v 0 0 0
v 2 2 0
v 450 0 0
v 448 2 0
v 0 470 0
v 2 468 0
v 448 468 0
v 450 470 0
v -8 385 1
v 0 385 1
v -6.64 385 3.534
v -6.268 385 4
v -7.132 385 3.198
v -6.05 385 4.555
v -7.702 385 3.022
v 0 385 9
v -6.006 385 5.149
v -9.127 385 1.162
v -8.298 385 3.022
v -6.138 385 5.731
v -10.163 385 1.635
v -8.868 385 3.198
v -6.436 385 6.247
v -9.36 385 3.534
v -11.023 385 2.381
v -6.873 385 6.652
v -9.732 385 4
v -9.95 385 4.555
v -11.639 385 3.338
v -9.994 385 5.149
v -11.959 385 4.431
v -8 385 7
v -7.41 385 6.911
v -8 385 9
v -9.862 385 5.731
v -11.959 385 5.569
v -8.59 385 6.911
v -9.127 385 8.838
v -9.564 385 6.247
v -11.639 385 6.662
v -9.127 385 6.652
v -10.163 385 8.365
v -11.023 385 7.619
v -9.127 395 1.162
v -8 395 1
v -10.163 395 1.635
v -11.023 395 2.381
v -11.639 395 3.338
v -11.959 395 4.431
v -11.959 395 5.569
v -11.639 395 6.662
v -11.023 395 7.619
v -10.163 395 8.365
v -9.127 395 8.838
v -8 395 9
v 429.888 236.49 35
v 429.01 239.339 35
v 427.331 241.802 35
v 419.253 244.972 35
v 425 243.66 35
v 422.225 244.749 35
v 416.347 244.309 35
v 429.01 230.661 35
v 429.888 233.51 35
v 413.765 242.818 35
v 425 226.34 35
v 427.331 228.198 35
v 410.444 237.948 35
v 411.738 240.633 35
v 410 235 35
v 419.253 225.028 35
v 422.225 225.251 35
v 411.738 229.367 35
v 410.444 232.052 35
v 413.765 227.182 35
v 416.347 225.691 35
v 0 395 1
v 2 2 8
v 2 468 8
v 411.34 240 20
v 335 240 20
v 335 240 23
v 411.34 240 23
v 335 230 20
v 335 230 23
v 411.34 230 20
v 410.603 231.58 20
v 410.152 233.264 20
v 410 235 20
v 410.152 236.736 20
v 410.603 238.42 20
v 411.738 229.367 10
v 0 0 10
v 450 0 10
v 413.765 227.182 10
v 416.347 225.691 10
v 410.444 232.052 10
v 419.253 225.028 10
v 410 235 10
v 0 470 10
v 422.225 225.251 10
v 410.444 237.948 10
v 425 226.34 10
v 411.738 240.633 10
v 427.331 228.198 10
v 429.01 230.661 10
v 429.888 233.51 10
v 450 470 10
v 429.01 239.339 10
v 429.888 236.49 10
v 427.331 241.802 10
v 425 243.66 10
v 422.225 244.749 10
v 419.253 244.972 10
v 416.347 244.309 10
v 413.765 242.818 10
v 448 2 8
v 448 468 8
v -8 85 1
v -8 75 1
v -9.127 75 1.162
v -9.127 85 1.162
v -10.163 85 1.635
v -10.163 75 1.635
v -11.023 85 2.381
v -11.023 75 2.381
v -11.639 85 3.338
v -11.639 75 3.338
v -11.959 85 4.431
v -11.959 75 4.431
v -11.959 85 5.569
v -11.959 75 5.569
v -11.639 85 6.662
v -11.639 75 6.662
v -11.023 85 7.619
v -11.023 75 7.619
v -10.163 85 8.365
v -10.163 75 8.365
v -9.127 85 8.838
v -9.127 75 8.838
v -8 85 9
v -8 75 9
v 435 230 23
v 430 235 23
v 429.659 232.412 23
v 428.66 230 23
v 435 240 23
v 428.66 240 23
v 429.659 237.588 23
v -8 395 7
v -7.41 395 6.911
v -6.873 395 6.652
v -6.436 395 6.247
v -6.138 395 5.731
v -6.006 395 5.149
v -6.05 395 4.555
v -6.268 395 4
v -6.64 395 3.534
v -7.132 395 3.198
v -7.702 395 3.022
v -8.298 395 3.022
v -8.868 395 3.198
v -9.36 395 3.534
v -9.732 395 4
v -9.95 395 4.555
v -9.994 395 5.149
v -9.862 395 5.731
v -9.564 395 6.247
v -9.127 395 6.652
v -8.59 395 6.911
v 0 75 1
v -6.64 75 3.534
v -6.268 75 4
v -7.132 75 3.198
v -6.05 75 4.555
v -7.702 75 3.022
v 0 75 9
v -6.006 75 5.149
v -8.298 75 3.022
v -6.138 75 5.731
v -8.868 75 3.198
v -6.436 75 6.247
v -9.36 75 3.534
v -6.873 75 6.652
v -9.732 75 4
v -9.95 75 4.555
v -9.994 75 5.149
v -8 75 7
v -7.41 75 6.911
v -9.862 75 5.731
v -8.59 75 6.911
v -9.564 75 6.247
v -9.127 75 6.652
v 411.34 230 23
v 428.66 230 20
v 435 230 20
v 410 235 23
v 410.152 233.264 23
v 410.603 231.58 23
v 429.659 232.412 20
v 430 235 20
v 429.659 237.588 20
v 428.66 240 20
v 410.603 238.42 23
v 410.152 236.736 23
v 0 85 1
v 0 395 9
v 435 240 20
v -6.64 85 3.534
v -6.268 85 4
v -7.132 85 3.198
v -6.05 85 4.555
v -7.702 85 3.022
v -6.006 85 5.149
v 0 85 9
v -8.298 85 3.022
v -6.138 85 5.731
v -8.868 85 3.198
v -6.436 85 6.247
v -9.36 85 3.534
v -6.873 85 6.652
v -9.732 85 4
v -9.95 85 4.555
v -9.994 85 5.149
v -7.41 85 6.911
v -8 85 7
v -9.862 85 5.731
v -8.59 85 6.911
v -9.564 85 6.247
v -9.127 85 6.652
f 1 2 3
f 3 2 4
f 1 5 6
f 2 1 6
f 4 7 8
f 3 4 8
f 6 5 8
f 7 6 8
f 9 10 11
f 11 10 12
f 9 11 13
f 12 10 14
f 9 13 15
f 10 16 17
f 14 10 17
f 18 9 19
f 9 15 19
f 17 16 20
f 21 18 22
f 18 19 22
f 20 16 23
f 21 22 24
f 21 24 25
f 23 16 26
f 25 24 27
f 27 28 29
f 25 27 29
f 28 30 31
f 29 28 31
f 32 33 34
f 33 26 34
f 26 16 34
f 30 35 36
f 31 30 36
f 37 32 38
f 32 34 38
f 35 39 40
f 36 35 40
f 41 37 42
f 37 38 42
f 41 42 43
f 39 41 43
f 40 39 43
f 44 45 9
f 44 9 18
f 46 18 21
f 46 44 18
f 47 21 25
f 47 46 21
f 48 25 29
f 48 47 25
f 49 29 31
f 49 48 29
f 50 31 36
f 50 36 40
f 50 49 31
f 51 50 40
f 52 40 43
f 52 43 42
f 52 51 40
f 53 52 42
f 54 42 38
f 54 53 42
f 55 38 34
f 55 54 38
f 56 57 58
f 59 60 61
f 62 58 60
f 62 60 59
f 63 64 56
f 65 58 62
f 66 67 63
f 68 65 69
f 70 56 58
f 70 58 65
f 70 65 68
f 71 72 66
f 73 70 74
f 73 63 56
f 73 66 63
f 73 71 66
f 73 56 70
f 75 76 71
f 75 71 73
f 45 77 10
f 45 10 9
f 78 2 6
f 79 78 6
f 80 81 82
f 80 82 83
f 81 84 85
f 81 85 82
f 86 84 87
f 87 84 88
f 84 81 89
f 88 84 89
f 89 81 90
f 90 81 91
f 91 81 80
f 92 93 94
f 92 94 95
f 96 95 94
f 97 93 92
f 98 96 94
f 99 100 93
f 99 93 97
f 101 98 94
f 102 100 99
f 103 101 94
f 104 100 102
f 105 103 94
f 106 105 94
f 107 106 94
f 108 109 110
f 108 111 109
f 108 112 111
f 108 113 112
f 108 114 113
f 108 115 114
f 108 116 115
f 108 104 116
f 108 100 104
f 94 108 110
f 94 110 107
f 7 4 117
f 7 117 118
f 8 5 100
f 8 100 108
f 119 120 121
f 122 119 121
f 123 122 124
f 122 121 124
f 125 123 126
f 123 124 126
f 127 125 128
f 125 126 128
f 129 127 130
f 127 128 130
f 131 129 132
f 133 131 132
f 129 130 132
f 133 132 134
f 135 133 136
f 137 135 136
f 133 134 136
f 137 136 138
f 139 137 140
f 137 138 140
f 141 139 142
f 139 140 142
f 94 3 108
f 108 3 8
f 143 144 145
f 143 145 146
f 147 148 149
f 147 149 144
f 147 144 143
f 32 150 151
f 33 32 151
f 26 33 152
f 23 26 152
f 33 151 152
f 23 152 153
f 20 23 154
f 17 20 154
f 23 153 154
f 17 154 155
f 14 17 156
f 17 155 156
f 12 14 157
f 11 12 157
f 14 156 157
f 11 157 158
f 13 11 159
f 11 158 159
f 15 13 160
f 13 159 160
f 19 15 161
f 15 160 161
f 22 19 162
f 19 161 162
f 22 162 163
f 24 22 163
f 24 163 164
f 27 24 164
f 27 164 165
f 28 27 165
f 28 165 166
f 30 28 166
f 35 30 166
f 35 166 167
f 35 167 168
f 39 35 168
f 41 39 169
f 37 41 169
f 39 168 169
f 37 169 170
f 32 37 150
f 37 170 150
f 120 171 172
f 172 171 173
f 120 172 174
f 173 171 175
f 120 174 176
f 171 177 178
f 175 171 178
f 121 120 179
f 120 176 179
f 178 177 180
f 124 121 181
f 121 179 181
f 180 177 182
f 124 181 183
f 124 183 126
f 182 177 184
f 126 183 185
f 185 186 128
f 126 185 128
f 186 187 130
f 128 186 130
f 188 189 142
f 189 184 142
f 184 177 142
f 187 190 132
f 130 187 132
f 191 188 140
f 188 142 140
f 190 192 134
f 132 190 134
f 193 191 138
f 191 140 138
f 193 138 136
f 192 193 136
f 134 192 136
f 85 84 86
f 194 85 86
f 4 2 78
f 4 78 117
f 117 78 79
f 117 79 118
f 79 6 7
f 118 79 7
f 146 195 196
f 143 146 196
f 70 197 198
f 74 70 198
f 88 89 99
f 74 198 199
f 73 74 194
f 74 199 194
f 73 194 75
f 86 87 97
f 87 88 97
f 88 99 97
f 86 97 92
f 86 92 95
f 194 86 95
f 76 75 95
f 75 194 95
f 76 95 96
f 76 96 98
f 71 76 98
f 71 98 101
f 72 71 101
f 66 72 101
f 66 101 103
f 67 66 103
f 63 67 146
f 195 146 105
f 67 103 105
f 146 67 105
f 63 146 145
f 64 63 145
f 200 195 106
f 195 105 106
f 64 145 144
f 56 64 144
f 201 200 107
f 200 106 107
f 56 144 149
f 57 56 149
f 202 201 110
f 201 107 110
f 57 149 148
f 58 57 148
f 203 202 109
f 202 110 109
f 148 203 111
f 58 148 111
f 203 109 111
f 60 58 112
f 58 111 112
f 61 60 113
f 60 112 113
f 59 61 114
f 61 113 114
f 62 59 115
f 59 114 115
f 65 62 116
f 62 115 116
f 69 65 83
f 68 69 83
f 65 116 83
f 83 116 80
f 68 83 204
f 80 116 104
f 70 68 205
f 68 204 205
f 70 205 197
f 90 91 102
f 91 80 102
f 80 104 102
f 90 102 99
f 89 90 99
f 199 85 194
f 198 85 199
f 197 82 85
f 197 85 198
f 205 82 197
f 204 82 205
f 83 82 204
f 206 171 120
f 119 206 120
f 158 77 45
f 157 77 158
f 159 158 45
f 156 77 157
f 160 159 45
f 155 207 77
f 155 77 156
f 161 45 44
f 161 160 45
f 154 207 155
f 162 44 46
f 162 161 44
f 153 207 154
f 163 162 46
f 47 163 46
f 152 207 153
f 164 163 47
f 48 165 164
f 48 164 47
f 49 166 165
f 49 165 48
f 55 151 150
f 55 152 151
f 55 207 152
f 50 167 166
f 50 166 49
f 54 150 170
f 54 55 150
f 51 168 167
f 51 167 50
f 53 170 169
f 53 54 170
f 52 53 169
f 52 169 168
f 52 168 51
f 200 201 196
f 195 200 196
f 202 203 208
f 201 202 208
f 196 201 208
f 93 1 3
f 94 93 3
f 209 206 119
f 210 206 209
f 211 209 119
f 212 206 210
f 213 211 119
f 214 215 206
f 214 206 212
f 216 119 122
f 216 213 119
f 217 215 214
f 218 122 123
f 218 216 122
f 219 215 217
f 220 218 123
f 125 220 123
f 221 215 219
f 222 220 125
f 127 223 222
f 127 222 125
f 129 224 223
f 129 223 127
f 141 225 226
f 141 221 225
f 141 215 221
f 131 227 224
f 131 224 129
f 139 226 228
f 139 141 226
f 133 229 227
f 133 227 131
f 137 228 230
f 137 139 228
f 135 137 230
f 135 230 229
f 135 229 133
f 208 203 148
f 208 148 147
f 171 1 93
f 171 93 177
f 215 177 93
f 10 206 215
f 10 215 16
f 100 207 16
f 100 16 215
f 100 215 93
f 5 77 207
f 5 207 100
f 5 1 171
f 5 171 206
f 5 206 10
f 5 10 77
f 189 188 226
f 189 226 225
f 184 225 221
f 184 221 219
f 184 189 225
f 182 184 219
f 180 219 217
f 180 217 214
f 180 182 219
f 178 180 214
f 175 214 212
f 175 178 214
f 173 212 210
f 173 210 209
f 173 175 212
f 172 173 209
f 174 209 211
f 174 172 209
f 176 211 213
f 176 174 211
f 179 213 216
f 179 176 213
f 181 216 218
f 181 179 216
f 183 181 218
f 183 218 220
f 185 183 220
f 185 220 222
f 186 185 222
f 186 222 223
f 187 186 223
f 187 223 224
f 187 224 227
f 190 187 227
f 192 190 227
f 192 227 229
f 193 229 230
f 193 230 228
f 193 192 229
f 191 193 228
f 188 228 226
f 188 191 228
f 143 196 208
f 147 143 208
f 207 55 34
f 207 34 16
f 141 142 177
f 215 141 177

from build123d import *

# Parameters (mm, degrees)
SKETCH1_W           = 450
SKETCH1_H           = 470
BASE_EXTRUDE_DEPTH  = 10
SHELL1_T            = -2
SKETCH2_R           = 2
BOSS_EXTRUDE1_DEPTH = 10
SKETCH3_R           = 10
BOSS_EXTRUDE2_DEPTH = 25
SKETCH4_W           = 100
SKETCH4_H           = 10
BOSS_EXTRUDE3_DEPTH = 3


with BuildPart() as part:
    # Sketch1 → Base-Extrude (new body)
    with BuildSketch(Plane.XY):
        with Locations((225, 235)):
            Rectangle(SKETCH1_W, SKETCH1_H)
    extrude(amount=BASE_EXTRUDE_DEPTH)

    # Shell1
    shell1_openings = [part.faces().sort_by_distance(p)[0] for p in [
        (225, 235, 0),
    ]]
    offset(amount=SHELL1_T, openings=shell1_openings, kind=Kind.INTERSECTION)

    # Sketch2 → Boss-Extrude1 (add)
    with BuildSketch(Plane(origin=(0, 395, 0), x_dir=(-1, 0, 0), z_dir=(0, 1, 0))):
        with BuildLine():
            Line((8, 9), (0, 9))
            Line((0, 9), (0, 1))
            Line((0, 1), (8, 1))
            ThreePointArc((8, 1), (12, 5), (8, 9))
        make_face()
        with Locations(Location((8, 5, 0), (0, 0, 90))):
            Circle(SKETCH2_R, mode=Mode.SUBTRACT)
    boss_extrude1 = extrude(amount=-BOSS_EXTRUDE1_DEPTH)

    # Mirror1: Boss-Extrude1 across plane
    add(boss_extrude1.mirror(Plane.ZX.offset(235)))

    # Sketch3 → Boss-Extrude2 (add)
    with BuildSketch(Plane.XY.offset(10)):
        with Locations(Location((420, 235, 0), (0, 0, 180))):
            Circle(SKETCH3_R)
    extrude(amount=BOSS_EXTRUDE2_DEPTH)

    # Sketch4 → Boss-Extrude3 (add)
    with BuildSketch(Plane.XY.offset(20)):
        with Locations((385, 235)):
            Rectangle(SKETCH4_W, SKETCH4_H)
    extrude(amount=BOSS_EXTRUDE3_DEPTH)


solid = part.part
